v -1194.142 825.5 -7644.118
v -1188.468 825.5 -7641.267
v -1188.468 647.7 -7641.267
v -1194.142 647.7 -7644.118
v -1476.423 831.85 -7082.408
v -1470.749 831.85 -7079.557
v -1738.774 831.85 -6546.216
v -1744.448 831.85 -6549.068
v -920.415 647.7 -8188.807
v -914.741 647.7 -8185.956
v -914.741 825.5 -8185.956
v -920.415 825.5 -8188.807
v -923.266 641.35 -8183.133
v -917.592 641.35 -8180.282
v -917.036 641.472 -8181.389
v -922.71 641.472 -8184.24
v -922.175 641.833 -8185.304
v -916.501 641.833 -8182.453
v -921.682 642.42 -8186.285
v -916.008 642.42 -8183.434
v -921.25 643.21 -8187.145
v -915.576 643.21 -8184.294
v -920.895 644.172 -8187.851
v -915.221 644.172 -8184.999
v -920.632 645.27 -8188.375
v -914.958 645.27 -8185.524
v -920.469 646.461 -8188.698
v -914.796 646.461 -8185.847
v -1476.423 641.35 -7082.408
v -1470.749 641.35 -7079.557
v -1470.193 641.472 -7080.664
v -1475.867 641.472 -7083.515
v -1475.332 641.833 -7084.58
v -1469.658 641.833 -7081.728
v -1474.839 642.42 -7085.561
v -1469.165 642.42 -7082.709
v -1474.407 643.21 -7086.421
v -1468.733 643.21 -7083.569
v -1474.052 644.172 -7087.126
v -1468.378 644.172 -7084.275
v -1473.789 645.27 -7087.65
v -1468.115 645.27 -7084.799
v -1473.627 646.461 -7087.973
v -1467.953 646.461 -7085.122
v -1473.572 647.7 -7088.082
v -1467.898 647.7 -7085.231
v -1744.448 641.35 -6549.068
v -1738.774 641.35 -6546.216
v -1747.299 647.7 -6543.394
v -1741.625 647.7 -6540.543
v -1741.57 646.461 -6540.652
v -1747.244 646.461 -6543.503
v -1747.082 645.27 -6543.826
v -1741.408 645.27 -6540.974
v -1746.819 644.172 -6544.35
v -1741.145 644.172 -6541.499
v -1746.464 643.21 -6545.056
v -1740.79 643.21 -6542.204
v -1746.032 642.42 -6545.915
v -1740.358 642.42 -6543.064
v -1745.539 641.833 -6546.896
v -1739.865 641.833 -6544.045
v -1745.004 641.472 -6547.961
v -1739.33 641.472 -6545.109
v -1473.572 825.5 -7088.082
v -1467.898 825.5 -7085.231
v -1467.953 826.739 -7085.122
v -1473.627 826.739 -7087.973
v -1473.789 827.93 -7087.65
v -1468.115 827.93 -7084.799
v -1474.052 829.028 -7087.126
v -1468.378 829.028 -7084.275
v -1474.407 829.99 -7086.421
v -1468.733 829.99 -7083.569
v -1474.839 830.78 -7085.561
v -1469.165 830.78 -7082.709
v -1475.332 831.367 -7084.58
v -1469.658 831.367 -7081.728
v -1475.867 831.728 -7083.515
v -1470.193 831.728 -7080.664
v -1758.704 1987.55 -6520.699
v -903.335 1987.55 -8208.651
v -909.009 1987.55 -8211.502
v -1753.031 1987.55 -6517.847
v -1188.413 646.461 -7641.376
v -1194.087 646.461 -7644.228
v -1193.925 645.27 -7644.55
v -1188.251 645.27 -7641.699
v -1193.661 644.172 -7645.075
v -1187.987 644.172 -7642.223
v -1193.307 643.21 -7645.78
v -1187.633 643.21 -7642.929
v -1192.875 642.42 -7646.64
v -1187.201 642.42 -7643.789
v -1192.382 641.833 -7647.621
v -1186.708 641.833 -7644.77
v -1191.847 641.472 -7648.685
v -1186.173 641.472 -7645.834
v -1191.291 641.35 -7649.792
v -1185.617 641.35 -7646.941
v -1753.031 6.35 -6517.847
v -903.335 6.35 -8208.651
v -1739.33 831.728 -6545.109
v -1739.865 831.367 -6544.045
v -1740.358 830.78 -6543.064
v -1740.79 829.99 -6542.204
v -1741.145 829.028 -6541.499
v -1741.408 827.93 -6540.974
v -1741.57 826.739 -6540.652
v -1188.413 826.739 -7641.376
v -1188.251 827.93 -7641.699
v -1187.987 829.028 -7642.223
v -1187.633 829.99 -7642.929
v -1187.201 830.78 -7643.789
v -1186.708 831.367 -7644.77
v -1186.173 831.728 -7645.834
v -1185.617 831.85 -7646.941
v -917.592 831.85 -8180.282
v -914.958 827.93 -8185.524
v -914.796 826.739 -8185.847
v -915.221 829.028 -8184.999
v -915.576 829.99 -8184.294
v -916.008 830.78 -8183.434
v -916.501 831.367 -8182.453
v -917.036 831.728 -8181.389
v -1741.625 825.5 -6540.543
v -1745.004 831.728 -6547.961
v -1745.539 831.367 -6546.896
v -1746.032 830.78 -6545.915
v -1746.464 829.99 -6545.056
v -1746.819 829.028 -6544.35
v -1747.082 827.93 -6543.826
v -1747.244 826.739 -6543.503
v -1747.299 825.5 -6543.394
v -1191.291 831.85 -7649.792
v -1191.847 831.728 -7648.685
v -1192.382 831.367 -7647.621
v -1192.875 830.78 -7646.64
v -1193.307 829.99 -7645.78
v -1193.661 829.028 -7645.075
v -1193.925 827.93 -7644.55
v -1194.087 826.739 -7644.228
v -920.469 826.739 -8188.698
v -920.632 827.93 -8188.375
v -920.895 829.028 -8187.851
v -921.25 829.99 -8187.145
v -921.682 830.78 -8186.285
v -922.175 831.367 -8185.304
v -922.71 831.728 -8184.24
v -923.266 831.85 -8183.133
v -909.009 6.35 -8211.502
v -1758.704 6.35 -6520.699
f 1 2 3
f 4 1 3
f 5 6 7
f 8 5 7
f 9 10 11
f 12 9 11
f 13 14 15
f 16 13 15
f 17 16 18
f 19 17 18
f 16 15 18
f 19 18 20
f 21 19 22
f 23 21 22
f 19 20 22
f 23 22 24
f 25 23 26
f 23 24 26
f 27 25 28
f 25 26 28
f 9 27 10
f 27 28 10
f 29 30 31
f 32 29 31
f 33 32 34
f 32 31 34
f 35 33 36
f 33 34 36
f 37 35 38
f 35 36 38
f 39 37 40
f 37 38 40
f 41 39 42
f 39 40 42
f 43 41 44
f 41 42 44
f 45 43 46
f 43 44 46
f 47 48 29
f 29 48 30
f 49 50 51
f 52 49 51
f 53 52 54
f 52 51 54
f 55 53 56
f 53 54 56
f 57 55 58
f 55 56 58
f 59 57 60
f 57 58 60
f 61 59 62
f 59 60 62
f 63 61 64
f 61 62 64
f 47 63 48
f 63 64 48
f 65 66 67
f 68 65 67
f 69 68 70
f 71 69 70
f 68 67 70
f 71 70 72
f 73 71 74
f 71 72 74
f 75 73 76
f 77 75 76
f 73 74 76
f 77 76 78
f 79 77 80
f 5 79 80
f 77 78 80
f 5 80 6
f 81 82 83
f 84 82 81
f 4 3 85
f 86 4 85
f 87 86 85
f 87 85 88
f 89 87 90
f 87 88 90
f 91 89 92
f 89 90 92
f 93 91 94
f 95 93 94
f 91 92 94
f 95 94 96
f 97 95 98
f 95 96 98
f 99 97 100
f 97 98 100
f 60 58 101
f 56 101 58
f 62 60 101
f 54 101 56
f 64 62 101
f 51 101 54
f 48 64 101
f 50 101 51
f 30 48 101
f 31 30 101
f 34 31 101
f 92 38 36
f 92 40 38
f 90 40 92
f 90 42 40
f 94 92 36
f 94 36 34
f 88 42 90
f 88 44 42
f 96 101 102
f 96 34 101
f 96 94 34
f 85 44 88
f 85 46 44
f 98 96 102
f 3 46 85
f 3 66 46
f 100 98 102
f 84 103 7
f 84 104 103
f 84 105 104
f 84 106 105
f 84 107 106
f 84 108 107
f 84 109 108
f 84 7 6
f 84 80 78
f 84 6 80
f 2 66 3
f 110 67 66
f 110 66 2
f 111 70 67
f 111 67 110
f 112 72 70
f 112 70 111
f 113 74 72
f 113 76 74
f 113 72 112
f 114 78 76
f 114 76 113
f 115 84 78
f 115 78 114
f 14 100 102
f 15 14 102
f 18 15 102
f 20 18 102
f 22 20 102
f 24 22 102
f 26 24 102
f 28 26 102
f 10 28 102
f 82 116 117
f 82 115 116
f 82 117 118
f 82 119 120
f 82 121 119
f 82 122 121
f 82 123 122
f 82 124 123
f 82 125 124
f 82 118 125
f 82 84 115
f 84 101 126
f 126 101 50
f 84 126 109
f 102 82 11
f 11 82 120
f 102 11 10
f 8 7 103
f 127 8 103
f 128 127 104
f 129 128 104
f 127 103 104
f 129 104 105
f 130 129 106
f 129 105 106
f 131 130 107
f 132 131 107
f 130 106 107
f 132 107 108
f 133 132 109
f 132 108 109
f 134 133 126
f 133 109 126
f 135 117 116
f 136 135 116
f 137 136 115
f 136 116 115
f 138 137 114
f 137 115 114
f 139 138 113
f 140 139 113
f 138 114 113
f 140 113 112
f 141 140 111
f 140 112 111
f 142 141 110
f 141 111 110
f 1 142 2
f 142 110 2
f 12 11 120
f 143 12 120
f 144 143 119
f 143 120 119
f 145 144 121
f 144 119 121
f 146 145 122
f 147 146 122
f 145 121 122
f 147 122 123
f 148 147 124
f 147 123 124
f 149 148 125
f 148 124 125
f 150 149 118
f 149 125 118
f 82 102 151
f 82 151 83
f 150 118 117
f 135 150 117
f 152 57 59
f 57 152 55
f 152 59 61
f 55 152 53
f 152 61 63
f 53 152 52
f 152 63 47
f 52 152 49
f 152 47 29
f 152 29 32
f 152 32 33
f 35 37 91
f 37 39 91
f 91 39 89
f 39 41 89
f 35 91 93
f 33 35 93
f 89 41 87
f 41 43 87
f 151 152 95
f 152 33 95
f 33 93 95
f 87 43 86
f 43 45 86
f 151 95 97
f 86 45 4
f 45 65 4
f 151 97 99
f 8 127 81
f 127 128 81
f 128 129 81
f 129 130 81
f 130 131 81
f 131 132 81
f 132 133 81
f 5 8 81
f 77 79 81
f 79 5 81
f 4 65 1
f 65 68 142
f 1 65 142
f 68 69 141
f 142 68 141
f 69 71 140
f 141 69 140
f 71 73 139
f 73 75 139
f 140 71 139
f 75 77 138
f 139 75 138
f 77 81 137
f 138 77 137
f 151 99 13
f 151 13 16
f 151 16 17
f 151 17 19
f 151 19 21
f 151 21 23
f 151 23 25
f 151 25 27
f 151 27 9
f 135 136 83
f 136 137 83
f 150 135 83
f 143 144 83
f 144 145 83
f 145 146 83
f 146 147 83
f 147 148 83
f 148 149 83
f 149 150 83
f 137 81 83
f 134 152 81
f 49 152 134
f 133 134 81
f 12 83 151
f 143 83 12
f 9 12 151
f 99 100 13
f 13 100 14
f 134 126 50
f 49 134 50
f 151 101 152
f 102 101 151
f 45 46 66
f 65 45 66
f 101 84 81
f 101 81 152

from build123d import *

# Parameters (mm, degrees)
BOSS_EXTRUDE1_DEPTH = 6.35


with BuildPart() as part:
    # Sketch1 → Boss-Extrude1 (new body)
    with BuildSketch(Plane(origin=(-4014.627423578, 0, -2017.507429852), x_dir=(0.44902769125579206, 0, -0.8935178411679832), z_dir=(0.8935178411679832, 0, 0.44902769125579206))):
        Polygon((5982.803488378, 1987.55), (5036.653488378, 1987.55), (5036.653488378, 6.35), (5982.803488378, 6.35), (6928.953488378, 6.35), (6928.953488378, 1987.55), align=None)
        with BuildLine():
            Line((6293.953488378, 825.5), (6293.953488378, 647.7))
            ThreePointArc((6293.953488378, 647.7), (6295.813360317, 643.209871939), (6300.303488378, 641.35))
            Line((6300.303488378, 641.35), (6897.203488378, 641.35))
            ThreePointArc((6897.203488378, 641.35), (6901.693616438, 643.209871939), (6903.553488378, 647.7))
            Line((6903.553488378, 647.7), (6903.553488378, 825.5))
            ThreePointArc((6903.553488378, 825.5), (6901.693616438, 829.990128061), (6897.203488378, 831.85))
            Line((6897.203488378, 831.85), (6300.303488378, 831.85))
            ThreePointArc((6300.303488378, 831.85), (6295.813360317, 829.990128061), (6293.953488378, 825.5))
        make_face(mode=Mode.SUBTRACT)
        with BuildLine():
            Line((5068.403488378, 641.35), (5665.303488378, 641.35))
            ThreePointArc((5665.303488378, 641.35), (5669.793616438, 643.209871939), (5671.653488378, 647.7))
            Line((5671.653488378, 647.7), (5671.653488378, 825.5))
            ThreePointArc((5671.653488378, 825.5), (5669.793616438, 829.990128061), (5665.303488378, 831.85))
            Line((5665.303488378, 831.85), (5068.403488378, 831.85))
            ThreePointArc((5068.403488378, 831.85), (5063.913360317, 829.990128061), (5062.053488378, 825.5))
            Line((5062.053488378, 825.5), (5062.053488378, 647.7))
            ThreePointArc((5062.053488378, 647.7), (5063.913360317, 643.209871939), (5068.403488378, 641.35))
        make_face(mode=Mode.SUBTRACT)
    extrude(amount=-BOSS_EXTRUDE1_DEPTH)


solid = part.part
